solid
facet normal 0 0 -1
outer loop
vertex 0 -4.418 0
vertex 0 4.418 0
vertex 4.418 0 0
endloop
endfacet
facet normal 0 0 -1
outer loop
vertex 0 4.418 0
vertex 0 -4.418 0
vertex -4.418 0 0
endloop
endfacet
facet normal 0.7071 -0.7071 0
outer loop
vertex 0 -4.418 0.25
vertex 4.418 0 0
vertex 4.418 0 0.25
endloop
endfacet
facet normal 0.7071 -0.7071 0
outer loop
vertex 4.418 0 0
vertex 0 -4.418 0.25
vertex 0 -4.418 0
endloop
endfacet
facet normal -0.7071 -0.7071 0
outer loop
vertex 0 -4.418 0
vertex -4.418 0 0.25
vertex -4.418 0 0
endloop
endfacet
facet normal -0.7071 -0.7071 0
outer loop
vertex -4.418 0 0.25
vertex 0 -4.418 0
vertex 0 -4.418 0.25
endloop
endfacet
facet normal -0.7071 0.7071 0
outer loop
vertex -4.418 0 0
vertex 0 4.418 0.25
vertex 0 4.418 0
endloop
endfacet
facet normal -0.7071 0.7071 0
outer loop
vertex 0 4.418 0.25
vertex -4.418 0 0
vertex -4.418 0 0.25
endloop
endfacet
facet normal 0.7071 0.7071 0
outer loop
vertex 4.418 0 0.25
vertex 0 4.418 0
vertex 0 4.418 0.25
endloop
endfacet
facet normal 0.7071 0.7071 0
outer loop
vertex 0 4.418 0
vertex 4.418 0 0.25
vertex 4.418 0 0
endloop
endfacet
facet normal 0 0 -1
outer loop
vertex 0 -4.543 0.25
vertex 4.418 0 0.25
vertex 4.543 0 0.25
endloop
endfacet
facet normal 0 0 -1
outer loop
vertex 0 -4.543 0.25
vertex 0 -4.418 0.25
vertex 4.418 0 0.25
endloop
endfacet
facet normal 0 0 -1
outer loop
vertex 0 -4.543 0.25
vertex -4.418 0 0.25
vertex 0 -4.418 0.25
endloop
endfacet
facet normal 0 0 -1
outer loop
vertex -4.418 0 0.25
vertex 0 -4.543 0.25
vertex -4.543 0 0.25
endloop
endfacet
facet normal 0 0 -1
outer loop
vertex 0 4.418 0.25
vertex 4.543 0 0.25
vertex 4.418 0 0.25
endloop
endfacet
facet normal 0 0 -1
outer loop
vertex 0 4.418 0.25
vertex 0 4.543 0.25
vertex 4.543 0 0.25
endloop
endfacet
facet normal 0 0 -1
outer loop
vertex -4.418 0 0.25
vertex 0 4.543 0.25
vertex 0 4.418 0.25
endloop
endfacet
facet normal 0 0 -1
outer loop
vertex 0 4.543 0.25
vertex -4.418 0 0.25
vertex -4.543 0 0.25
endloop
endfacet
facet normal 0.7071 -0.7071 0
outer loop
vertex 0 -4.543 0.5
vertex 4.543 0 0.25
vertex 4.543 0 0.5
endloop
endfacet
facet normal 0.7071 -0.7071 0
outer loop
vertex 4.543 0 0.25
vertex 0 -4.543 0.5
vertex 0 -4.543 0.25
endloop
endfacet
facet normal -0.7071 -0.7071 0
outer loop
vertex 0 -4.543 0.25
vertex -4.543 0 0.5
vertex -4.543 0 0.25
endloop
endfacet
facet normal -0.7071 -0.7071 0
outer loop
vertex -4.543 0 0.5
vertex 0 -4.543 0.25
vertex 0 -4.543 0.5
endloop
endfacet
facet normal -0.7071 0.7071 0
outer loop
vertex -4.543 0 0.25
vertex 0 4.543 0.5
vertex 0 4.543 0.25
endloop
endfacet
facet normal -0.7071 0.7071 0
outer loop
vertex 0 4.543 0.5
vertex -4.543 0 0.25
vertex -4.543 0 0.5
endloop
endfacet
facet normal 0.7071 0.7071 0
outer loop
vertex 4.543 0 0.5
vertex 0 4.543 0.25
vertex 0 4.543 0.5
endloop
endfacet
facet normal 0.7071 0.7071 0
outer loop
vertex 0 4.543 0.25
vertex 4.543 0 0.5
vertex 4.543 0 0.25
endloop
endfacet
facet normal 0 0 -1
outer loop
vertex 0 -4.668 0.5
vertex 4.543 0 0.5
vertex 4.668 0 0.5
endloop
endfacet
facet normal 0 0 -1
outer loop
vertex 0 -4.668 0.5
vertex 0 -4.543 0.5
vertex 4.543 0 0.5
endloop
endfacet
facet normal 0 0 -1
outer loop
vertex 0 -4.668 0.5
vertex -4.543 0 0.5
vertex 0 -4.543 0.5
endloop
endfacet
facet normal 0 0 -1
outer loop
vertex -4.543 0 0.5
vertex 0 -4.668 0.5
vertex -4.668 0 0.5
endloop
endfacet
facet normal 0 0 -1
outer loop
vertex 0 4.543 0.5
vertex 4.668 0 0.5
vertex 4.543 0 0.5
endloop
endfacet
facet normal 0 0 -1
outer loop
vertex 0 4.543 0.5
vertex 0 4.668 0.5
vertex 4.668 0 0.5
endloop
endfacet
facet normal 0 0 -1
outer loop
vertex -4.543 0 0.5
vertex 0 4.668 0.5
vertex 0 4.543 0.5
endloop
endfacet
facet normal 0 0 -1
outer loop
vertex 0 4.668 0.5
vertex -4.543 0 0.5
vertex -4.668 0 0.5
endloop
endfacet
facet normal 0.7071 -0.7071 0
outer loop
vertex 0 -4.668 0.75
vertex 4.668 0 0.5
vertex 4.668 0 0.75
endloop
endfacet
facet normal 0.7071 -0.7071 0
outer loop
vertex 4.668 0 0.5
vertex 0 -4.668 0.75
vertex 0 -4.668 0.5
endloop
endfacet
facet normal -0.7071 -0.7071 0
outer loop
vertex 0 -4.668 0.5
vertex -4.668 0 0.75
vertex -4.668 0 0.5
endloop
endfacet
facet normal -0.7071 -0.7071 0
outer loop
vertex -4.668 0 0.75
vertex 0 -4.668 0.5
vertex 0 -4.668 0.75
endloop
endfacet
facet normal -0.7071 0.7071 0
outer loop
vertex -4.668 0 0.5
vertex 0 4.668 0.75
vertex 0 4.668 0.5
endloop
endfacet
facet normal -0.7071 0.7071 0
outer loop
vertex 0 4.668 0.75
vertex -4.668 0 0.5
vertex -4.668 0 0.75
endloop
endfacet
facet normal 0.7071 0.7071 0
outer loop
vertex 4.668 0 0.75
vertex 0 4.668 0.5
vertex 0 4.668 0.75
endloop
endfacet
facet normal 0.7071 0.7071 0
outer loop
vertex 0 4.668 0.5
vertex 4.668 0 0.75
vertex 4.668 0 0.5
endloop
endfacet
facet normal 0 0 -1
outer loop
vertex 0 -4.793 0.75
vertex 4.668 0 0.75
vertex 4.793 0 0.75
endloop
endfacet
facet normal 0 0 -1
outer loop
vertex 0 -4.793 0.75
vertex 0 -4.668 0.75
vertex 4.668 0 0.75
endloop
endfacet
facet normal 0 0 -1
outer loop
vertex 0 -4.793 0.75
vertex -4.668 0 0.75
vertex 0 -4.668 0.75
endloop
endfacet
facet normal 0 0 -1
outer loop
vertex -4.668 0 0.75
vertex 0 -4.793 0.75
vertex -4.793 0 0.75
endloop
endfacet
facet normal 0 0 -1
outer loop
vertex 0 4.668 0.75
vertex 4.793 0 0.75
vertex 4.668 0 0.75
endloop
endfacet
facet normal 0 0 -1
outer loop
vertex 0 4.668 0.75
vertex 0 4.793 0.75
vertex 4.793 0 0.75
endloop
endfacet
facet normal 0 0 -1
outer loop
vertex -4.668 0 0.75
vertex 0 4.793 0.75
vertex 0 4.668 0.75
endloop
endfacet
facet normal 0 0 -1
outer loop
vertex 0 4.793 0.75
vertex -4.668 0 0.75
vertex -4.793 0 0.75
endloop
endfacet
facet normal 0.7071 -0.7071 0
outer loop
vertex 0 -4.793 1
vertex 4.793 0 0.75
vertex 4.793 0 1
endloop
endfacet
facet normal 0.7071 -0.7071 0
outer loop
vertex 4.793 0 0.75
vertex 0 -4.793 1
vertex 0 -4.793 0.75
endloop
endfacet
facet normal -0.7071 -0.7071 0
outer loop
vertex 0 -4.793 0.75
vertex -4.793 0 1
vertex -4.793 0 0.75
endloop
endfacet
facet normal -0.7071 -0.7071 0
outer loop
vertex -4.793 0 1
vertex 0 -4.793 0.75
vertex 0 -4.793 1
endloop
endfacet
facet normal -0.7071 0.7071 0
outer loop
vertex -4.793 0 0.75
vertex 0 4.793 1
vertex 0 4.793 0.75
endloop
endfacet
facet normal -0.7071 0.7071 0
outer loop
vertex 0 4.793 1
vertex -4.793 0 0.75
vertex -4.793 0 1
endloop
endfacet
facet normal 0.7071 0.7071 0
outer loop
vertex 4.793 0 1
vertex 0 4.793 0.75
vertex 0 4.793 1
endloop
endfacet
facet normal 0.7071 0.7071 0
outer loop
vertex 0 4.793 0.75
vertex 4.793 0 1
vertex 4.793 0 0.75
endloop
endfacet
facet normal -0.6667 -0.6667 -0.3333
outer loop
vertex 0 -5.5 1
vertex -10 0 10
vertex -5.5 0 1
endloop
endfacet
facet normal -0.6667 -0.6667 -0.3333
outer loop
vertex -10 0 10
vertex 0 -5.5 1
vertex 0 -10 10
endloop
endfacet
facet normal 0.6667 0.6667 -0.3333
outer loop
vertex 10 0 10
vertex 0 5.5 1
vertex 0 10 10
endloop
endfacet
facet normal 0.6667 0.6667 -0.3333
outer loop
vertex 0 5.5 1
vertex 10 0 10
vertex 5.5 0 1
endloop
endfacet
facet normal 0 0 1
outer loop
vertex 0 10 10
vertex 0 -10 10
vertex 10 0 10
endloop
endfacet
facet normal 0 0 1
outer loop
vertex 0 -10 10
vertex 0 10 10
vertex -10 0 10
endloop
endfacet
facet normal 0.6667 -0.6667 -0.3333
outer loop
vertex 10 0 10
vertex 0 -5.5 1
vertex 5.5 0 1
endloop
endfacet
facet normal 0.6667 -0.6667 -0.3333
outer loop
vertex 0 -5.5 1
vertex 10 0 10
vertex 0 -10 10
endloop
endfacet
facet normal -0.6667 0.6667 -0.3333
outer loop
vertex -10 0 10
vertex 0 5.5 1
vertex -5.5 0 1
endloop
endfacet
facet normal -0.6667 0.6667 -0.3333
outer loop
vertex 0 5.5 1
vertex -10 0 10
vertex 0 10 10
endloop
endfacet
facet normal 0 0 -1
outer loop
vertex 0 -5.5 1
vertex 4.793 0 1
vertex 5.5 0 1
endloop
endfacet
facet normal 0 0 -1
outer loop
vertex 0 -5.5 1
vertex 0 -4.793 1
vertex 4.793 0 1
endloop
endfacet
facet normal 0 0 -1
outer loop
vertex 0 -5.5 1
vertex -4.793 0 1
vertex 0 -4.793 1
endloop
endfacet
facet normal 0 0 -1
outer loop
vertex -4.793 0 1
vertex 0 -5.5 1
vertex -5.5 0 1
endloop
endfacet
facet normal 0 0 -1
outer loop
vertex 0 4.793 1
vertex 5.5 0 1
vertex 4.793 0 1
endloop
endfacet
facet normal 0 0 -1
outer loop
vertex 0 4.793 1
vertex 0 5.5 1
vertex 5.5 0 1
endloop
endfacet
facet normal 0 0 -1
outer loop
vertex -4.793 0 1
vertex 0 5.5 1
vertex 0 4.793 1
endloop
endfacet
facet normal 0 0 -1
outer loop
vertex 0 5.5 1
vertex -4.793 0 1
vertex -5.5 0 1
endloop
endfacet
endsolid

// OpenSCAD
$eps = 0.01;

module SLA_Shrink_Bottom(l=0.2, d=0.5, n=1, color = 0, max=1000, renderOnly=true) {
    module shrinked() {
        for (i=[1:n]) {
            z=l/n*i;
            h=l/n;

            echo("cut at z=", z, "h=", h);
            translate([0,0,h*(i-1)])
            linear_extrude(height=h+$eps)
            offset(r=-d)
            projection(cut=true) {
                translate([0,0,-z])
                children();
            }
        }
    }
    if (renderOnly && $preview) {
        children();
    } else {
        if (color == 0) {
            shrinked() children();
        } else {
            color(color)
            shrinked() children();
        }
        difference(){
            children();
            translate([0,0,-max/2+l])
            cube(size=[max, max, max], center=true);
        }
    }
}

SLA_Shrink_Bottom(l=1, n=4, renderOnly = false)
cylinder(r1=5, r2=10, h=10, $fn=4);
